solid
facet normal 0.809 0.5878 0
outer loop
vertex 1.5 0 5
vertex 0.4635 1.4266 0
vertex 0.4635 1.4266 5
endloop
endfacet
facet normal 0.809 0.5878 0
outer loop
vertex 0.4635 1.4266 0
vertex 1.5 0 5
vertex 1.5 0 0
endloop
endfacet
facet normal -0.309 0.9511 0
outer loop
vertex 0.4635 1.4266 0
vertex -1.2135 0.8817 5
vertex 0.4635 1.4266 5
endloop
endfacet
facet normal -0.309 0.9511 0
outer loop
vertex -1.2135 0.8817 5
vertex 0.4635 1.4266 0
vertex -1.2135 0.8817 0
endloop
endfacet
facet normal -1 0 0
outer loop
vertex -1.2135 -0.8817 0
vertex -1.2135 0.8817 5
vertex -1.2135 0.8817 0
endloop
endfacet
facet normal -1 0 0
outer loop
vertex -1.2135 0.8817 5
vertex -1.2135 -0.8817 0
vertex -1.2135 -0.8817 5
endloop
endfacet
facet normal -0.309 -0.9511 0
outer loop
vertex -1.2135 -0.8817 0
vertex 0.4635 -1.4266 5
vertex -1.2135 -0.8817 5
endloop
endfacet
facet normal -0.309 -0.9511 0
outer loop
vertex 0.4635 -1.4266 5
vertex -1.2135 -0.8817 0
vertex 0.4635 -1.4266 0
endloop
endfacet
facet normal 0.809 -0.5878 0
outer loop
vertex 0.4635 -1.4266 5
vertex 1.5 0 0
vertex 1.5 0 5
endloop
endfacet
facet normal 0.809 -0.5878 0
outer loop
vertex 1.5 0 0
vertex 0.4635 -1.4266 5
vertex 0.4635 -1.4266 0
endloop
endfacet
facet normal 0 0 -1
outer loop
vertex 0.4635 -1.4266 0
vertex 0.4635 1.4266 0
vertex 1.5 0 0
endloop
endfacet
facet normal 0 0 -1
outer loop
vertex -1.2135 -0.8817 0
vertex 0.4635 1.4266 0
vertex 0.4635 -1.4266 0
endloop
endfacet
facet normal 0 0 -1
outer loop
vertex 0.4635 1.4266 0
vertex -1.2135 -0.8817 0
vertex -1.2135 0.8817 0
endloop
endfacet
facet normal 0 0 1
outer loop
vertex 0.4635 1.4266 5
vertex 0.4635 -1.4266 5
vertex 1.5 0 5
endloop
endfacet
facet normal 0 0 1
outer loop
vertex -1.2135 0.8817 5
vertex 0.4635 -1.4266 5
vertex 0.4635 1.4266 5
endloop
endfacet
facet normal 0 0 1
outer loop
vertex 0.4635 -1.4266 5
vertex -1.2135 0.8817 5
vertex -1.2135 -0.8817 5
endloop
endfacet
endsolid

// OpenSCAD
// part_id: sp6
// name: SP6 rivet pin
// source_drawing_ids: DRW-022
// units: mm
// revision: 0.1-placeholder
// SPDX-License-Identifier: MIT

module part_sp6(pin_d = 3, pin_h = 5) {
    cylinder(d = pin_d, h = pin_h, center = false);
}


// ---- "main guard" ----
// Default to previewing when opened directly:
if (is_undef(__LIB_MODE__)) {
    part_sp6();
}
